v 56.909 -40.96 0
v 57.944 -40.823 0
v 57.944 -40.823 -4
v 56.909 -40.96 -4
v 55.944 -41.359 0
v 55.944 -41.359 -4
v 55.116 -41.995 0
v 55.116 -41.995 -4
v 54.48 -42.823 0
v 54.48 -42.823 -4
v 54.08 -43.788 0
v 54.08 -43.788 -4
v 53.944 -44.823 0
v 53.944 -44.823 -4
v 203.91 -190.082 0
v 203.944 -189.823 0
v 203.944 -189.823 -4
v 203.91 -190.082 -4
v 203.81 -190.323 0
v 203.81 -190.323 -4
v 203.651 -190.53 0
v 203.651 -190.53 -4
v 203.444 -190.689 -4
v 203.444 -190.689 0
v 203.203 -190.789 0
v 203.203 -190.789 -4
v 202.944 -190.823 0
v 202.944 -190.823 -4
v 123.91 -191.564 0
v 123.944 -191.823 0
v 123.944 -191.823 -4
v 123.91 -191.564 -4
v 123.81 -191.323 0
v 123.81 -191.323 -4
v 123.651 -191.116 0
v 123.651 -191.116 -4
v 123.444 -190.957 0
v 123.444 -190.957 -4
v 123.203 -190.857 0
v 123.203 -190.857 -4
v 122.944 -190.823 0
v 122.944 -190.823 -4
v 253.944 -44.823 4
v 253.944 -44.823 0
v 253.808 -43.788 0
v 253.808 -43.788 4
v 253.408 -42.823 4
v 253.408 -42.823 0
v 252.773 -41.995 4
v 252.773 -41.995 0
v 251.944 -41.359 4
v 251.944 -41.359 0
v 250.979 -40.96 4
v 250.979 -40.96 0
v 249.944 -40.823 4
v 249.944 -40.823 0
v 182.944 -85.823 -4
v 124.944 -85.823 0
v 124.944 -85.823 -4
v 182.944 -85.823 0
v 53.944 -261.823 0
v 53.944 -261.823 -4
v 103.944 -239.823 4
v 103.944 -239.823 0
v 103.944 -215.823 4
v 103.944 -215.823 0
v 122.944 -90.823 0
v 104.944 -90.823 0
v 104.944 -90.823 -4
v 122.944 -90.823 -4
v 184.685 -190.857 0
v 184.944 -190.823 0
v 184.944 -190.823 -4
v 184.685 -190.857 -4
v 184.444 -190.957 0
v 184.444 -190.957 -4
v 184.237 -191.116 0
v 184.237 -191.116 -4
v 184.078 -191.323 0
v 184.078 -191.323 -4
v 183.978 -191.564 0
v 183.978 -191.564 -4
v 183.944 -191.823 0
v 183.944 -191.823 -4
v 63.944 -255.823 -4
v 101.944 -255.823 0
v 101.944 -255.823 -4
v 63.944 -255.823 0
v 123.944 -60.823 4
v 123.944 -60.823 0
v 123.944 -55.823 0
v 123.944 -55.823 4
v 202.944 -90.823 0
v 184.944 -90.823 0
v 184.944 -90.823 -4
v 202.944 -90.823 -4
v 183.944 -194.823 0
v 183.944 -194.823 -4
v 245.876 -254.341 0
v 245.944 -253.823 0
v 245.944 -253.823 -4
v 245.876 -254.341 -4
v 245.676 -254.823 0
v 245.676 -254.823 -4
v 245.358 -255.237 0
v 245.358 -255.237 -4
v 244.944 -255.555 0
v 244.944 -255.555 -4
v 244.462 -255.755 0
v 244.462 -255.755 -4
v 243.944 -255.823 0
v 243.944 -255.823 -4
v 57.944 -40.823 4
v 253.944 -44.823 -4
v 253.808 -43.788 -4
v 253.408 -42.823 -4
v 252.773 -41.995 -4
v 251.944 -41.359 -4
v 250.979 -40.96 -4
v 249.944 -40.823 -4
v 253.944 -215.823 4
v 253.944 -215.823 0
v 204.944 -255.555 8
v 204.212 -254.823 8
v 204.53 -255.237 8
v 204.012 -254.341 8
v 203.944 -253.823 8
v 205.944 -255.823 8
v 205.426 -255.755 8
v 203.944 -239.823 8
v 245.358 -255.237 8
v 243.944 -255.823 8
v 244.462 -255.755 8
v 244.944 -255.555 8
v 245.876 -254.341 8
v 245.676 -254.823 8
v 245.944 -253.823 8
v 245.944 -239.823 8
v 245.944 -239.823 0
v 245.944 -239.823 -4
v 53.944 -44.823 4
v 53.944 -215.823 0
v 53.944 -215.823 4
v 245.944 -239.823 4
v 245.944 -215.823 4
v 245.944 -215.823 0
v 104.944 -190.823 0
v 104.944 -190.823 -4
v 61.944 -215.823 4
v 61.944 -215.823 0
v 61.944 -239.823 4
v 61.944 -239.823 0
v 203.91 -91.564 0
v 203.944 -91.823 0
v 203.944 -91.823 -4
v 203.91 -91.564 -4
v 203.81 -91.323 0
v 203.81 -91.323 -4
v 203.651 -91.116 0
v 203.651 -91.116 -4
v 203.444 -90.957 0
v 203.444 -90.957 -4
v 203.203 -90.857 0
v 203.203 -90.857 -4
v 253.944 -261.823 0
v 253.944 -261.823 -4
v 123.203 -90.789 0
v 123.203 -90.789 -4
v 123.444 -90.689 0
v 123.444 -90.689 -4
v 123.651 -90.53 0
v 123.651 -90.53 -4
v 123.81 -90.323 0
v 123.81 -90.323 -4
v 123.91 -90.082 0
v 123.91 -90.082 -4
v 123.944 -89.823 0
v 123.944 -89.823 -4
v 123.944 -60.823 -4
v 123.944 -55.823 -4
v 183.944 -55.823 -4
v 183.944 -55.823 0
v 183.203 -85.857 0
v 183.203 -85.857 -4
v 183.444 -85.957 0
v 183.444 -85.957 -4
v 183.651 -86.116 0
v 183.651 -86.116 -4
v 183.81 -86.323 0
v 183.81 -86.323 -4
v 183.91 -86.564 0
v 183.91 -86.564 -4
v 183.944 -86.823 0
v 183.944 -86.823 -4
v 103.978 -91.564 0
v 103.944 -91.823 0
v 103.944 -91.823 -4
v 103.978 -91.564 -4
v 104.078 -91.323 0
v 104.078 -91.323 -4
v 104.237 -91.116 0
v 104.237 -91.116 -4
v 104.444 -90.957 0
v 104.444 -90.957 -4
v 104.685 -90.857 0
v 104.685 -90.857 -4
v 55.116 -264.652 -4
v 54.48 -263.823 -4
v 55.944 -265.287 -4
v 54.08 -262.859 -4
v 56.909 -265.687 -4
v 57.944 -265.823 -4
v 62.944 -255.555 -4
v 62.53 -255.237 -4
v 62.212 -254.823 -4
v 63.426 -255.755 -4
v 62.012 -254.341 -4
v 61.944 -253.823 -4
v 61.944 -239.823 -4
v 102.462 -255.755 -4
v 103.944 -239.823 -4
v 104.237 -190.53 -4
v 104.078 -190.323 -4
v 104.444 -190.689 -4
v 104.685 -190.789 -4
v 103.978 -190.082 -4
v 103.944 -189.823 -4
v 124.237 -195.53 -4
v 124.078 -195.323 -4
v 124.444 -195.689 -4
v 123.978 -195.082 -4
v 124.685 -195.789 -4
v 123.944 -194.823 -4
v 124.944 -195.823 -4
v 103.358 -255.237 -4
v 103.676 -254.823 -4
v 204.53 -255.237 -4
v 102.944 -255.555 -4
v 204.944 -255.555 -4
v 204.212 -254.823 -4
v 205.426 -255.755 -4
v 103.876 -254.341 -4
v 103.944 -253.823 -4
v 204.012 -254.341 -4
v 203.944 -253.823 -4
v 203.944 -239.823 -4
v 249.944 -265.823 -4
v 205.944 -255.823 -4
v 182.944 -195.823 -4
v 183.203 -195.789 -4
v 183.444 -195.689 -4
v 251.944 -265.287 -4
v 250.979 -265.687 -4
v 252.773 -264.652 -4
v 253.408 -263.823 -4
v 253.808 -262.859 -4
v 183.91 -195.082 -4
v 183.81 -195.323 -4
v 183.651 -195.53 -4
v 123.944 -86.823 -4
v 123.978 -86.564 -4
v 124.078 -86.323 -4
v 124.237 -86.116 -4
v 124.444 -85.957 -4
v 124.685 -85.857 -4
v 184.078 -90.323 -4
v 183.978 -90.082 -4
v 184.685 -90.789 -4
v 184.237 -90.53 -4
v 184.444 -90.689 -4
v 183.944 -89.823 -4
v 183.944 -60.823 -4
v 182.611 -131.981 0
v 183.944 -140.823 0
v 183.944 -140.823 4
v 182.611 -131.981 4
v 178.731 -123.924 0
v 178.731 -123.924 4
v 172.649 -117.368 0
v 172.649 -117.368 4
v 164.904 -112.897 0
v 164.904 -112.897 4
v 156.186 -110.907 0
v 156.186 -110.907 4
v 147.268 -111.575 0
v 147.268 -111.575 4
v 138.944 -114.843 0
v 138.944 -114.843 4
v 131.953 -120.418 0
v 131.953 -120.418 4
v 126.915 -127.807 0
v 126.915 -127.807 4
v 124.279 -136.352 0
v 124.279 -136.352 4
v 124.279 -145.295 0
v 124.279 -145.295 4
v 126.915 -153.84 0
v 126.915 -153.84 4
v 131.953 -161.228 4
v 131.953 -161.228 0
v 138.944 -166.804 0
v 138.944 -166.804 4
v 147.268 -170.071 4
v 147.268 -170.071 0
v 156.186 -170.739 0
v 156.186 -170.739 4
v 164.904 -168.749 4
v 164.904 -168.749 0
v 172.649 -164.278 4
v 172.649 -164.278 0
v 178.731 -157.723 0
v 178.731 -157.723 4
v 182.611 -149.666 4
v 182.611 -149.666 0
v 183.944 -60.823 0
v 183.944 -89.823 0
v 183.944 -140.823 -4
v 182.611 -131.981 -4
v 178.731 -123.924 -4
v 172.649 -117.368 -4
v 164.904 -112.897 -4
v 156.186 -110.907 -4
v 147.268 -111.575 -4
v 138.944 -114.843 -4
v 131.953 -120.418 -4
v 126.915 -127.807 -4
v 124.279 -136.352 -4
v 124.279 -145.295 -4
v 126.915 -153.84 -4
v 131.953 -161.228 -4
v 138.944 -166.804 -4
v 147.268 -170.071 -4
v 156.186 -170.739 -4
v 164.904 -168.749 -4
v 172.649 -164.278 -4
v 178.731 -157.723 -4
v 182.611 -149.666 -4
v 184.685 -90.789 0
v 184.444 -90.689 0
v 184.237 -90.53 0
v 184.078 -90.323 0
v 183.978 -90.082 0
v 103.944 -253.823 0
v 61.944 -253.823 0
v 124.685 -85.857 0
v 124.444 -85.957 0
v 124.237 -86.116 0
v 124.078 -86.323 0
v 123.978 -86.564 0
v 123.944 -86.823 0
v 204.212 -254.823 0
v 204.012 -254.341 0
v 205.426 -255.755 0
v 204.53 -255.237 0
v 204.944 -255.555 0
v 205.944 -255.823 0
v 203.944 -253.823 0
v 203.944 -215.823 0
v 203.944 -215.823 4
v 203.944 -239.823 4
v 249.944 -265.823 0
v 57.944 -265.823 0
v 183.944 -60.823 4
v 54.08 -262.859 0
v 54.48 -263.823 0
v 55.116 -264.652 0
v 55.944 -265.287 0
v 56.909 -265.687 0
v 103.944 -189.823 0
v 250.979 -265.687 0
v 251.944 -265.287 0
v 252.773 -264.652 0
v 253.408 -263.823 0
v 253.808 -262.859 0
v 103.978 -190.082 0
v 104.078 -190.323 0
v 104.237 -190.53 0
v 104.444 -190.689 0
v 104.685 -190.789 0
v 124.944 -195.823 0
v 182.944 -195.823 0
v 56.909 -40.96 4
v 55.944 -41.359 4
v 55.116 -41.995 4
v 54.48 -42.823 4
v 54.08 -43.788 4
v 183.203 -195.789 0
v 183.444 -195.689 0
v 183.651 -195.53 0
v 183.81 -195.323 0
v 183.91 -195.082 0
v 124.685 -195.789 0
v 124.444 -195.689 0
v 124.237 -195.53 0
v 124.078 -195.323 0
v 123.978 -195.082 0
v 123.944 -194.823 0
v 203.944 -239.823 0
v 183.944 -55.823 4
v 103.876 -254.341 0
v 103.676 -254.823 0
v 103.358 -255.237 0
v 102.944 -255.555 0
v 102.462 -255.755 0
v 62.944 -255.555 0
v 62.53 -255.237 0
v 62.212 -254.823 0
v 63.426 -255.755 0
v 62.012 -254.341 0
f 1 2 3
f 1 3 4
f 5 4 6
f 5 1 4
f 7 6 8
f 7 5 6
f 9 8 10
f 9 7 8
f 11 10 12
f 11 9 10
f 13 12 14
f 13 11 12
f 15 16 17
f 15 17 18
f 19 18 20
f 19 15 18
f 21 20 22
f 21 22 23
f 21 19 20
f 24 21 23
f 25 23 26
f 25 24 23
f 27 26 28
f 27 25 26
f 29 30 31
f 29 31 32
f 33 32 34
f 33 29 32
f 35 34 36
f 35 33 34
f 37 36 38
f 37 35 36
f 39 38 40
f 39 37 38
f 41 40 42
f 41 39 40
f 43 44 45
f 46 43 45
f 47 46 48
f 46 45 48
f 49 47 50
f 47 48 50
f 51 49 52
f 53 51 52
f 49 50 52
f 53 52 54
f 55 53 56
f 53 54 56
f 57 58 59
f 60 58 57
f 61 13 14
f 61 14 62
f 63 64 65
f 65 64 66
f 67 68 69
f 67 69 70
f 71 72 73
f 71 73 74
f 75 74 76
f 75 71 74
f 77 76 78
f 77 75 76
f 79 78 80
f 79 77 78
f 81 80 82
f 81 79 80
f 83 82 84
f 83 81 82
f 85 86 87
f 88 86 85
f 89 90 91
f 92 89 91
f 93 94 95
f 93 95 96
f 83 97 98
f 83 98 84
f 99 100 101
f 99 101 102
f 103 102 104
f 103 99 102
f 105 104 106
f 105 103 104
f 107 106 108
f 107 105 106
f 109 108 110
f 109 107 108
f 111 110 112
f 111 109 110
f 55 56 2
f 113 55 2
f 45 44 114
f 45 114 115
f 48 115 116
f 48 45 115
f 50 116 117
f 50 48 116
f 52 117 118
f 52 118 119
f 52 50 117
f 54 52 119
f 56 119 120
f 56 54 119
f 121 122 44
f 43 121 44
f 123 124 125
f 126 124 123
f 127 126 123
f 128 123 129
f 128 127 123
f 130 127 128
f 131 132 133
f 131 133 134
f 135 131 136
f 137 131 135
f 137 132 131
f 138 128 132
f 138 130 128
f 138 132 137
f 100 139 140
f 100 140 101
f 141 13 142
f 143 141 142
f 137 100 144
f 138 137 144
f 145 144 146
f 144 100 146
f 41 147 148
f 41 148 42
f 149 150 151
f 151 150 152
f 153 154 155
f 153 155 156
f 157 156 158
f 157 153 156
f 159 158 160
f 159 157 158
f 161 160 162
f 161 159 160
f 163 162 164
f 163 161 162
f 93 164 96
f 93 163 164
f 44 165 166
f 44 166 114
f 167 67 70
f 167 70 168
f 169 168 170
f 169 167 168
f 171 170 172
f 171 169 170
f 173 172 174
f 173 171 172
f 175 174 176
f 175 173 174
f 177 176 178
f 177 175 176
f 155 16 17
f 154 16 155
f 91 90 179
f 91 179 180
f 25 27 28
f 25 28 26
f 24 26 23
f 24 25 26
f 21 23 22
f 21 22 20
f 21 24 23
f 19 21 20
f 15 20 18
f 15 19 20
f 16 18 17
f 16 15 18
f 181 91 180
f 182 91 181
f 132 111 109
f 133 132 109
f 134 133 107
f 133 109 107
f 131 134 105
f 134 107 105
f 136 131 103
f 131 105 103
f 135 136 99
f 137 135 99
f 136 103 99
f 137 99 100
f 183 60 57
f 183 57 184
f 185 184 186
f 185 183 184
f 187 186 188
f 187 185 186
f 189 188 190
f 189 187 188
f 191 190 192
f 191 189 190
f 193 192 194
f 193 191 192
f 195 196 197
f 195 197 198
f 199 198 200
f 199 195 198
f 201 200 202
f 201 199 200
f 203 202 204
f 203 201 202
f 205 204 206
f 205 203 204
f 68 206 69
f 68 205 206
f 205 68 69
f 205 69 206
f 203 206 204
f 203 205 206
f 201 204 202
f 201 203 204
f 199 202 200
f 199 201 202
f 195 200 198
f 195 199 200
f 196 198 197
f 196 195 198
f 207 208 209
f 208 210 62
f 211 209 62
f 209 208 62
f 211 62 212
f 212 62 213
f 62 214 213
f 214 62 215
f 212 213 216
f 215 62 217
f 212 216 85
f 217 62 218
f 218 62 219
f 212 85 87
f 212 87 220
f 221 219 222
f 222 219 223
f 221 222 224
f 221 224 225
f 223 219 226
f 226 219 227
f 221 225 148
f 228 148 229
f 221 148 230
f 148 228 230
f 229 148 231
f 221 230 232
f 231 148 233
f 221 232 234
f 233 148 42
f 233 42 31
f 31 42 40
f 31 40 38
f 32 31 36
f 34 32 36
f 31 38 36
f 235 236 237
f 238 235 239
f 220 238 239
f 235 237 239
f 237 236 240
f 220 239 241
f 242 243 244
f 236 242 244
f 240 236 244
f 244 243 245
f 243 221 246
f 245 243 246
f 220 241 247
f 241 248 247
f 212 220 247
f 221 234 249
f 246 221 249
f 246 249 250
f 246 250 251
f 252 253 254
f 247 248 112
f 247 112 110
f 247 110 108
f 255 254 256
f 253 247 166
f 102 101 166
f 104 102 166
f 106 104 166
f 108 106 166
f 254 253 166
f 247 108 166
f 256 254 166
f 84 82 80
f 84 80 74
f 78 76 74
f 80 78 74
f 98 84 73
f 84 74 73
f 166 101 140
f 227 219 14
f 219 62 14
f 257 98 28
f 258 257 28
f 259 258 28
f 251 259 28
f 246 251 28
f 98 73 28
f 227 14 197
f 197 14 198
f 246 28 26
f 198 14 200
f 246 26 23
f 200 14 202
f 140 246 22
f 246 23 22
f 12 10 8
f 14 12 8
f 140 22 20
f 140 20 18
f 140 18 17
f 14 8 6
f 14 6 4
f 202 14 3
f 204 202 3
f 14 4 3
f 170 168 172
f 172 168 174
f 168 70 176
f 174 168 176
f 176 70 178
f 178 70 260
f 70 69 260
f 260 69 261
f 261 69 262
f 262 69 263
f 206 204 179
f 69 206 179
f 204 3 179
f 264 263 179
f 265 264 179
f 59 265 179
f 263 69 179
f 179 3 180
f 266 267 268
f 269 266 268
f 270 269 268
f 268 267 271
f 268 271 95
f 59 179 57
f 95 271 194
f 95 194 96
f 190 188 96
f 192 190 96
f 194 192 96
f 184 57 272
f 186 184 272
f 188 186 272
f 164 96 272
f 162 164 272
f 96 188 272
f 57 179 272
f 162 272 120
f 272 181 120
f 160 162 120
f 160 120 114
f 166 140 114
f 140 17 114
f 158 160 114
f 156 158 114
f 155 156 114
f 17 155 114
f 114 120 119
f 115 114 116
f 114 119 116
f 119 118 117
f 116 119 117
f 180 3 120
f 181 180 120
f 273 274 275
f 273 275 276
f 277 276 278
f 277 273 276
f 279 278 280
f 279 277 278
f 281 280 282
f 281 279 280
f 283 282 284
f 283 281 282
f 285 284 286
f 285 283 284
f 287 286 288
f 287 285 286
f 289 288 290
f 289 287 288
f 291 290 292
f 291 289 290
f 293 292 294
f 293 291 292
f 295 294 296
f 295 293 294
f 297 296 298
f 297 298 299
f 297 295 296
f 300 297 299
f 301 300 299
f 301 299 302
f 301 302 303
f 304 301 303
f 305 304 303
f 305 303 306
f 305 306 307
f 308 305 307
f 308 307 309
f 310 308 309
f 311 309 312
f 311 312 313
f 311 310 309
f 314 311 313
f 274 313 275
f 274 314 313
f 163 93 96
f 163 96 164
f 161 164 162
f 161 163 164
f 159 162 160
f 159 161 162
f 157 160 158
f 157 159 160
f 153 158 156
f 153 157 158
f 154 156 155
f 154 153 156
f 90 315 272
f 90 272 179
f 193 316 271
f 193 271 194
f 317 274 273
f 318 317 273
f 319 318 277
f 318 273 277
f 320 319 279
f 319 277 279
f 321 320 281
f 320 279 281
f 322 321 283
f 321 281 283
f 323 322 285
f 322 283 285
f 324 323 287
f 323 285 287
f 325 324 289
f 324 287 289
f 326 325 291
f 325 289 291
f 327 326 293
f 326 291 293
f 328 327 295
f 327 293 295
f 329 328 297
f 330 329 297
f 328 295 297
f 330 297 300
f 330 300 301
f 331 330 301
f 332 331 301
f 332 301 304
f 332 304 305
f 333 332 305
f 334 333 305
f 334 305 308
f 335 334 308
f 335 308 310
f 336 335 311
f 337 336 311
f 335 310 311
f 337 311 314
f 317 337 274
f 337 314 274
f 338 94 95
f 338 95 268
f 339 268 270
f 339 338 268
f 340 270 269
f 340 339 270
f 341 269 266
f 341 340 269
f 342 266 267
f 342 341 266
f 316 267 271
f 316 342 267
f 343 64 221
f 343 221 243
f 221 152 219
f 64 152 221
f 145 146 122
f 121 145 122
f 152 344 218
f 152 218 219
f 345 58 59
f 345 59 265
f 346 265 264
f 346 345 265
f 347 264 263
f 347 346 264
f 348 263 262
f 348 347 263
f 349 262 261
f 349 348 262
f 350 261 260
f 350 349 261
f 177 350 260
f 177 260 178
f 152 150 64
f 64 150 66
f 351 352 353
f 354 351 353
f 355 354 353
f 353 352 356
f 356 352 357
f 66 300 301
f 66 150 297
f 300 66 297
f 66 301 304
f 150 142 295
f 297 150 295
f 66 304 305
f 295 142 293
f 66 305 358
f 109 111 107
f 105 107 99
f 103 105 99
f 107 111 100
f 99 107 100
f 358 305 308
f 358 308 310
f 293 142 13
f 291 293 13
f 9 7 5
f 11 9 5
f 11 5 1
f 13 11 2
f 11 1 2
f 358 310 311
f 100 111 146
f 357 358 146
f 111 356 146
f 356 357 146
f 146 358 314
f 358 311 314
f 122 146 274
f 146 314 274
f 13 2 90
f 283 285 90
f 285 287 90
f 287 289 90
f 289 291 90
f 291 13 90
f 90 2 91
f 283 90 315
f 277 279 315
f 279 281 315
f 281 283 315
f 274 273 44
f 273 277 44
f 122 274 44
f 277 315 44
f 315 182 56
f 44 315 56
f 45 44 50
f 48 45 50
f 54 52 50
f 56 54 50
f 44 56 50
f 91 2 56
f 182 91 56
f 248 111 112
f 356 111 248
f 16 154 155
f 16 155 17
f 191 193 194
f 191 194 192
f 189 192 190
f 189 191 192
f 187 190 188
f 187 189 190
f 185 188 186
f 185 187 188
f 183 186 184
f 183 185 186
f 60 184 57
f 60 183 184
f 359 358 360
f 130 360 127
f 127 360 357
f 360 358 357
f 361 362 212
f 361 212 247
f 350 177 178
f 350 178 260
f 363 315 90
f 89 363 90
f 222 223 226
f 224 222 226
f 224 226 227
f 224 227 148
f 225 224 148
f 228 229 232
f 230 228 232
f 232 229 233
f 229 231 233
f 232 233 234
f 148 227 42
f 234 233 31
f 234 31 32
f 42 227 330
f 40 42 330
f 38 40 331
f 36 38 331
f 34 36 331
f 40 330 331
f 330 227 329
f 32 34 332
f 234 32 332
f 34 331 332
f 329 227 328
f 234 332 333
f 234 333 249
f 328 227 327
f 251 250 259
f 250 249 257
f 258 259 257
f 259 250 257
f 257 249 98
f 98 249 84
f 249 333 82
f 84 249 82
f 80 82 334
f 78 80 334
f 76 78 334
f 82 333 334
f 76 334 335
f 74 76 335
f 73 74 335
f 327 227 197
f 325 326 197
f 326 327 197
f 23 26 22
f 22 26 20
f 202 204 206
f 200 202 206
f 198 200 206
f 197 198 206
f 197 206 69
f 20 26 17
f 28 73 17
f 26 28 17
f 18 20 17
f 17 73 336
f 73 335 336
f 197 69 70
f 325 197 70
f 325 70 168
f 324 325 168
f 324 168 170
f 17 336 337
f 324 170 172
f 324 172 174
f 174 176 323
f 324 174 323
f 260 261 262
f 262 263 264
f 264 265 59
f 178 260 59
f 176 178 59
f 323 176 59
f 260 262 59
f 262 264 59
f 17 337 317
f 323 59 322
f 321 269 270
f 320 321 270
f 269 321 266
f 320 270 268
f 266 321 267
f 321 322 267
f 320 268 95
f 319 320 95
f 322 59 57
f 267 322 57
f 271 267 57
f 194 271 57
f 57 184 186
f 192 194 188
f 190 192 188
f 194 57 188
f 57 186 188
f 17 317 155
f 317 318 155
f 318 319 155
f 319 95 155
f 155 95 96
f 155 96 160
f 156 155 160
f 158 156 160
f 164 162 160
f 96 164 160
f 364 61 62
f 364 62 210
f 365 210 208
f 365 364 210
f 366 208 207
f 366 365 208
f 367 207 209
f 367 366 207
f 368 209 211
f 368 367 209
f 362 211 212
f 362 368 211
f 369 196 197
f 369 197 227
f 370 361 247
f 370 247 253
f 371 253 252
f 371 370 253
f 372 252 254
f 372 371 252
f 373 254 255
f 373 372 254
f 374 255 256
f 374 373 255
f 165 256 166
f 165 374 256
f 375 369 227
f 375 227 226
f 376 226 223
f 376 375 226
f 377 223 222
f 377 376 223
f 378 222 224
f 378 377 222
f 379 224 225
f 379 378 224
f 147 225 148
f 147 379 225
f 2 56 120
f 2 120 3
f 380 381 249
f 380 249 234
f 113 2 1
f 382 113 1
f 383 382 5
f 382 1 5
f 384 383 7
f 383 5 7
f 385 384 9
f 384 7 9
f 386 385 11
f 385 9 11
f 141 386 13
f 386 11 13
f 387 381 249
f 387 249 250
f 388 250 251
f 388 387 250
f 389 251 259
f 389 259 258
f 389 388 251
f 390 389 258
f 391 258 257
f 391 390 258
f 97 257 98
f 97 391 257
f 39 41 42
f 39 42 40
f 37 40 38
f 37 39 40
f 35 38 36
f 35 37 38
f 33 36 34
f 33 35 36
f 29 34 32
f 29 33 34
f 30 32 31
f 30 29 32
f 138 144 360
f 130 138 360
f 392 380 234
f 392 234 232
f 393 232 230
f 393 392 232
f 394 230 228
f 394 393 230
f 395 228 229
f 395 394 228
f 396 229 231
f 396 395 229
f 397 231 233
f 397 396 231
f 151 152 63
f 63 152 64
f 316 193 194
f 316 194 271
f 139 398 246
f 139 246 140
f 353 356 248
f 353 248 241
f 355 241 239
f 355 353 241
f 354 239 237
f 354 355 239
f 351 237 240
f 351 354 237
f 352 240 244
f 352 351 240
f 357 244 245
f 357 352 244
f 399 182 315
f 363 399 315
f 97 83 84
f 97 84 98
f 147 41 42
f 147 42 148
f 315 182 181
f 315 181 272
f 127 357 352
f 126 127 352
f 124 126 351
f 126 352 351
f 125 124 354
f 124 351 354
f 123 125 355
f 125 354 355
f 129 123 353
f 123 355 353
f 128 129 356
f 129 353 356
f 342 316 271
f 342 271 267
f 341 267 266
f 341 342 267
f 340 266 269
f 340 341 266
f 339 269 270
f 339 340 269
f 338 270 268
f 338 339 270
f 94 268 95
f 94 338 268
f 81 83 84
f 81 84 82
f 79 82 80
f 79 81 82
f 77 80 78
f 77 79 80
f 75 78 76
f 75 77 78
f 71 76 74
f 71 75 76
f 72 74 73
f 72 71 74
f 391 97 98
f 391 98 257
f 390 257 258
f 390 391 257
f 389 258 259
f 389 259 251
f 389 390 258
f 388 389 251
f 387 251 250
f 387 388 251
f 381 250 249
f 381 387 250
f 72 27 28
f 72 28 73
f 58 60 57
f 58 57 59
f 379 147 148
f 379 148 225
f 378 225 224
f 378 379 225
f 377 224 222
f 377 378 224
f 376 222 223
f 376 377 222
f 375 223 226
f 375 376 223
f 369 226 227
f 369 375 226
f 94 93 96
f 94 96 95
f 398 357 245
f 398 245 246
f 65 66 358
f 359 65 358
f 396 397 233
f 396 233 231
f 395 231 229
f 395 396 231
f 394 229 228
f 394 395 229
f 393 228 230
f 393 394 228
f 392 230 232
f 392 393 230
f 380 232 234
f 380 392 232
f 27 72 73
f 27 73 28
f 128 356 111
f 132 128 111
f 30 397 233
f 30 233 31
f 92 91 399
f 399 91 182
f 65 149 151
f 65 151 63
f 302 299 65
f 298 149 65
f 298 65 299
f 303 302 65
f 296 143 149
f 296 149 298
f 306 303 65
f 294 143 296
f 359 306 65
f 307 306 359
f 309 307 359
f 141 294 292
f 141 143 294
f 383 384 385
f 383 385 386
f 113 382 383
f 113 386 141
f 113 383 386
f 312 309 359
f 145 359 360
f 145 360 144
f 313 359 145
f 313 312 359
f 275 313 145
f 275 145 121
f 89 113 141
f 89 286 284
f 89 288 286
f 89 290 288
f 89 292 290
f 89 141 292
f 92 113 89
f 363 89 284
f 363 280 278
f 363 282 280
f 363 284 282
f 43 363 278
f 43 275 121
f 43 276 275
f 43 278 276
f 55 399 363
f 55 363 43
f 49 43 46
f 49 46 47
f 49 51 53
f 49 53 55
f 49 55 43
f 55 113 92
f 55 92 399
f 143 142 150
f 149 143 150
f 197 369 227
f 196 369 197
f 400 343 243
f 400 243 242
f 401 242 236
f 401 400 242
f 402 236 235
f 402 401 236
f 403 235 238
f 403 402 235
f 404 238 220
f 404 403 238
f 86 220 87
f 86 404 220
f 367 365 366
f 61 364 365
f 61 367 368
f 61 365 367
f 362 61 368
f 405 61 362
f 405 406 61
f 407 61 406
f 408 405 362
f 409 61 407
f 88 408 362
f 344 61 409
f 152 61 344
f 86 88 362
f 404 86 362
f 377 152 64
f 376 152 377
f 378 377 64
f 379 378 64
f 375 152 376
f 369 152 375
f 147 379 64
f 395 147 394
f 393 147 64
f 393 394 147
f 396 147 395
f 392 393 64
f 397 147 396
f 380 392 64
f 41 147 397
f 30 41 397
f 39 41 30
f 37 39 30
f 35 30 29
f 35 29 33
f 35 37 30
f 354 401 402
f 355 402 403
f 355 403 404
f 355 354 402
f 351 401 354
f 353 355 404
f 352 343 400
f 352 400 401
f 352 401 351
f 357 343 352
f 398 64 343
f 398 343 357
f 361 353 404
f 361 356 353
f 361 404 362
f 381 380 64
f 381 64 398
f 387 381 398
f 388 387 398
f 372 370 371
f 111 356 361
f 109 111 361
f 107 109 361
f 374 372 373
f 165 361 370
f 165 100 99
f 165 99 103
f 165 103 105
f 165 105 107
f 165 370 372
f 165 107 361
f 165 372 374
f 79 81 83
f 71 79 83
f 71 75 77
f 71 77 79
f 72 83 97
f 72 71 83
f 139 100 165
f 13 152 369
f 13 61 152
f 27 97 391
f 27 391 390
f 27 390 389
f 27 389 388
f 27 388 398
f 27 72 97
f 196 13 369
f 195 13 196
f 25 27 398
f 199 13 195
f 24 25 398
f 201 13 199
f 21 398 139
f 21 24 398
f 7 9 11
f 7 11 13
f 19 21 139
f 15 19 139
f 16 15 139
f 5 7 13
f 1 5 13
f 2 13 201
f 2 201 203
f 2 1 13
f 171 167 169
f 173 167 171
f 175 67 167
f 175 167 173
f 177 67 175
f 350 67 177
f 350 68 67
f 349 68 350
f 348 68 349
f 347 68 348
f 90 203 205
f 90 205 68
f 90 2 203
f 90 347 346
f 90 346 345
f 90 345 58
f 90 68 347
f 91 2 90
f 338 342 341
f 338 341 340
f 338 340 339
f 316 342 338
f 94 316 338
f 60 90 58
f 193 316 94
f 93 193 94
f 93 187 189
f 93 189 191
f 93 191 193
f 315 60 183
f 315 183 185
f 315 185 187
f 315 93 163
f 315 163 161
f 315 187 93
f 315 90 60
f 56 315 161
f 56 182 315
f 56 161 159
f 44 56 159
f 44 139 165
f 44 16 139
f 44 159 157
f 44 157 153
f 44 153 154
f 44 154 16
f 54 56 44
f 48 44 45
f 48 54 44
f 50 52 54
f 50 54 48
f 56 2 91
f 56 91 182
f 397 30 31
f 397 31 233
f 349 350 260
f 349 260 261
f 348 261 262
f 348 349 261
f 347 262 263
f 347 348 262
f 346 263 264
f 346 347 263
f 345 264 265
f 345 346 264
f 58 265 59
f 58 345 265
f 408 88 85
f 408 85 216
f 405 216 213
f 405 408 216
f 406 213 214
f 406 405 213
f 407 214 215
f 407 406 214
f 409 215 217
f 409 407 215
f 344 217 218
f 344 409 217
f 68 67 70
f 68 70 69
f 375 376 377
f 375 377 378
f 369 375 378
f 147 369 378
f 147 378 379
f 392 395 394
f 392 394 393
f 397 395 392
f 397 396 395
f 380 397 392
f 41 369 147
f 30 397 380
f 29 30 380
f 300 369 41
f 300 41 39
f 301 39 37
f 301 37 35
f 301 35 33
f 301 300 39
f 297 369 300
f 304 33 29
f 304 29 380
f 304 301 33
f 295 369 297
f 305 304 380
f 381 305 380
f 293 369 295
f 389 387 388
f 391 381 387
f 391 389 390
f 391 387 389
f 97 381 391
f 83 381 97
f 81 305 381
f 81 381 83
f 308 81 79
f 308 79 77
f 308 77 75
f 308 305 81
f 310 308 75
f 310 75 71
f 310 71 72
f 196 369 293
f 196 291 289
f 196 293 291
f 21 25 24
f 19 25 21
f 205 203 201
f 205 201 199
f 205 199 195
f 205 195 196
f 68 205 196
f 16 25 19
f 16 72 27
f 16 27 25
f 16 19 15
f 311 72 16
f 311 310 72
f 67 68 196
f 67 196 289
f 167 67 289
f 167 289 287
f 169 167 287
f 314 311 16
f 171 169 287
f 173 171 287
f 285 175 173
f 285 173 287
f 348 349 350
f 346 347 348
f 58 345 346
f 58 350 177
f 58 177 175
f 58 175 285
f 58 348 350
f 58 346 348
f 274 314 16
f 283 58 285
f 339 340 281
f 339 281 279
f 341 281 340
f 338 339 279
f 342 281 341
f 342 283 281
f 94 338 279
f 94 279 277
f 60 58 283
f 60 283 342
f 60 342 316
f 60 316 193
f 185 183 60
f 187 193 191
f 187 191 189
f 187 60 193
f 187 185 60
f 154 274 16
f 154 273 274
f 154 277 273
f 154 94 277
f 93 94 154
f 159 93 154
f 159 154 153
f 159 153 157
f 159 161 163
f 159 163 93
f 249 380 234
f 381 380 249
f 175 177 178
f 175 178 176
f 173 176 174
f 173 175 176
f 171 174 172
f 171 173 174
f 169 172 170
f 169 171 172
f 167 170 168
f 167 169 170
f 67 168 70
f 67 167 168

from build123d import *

# Parameters (mm, degrees)
F1_R     = 30
F2_DEPTH = 4
F3_DEPTH = 4
F4_DEPTH = 4
F5_DEPTH = 8


with BuildPart() as f2:
    # F1 (on Top) → F2 (new body)
    with BuildSketch(Plane.XY):
        with BuildLine():
            Line((249.9441257715, -40.8232776821), (57.9441257715, -40.8232776821))
            ThreePointArc((57.9441257715, -40.8232776821), (55.1156986468, -41.9948505573), (53.9441257715, -44.8232776821))
            Line((53.9441257715, -44.8232776821), (53.9441257715, -215.8232776821))
            Line((53.9441257715, -215.8232776821), (61.9441257715, -215.8232776821))
            Line((61.9441257715, -215.8232776821), (61.9441257715, -239.8232776821))
            Line((61.9441257715, -239.8232776821), (103.9441257715, -239.8232776821))
            Line((103.9441257715, -239.8232776821), (103.9441257715, -215.8232776821))
            Line((103.9441257715, -215.8232776821), (203.9441257715, -215.8232776821))
            Line((203.9441257715, -215.8232776821), (203.9441257715, -239.8232776821))
            Line((203.9441257715, -239.8232776821), (245.9441257715, -239.8232776821))
            Line((245.9441257715, -239.8232776821), (245.9441257715, -215.8232776821))
            Line((245.9441257715, -215.8232776821), (253.9441257715, -215.8232776821))
            Line((253.9441257715, -215.8232776821), (253.9441257715, -44.8232776821))
            ThreePointArc((253.9441257715, -44.8232776821), (252.7725528963, -41.9948505573), (249.9441257715, -40.8232776821))
        make_face()
        with BuildLine():
            Line((124.9441257715, -85.8232776821), (153.9441257715, -85.8232776821))
            Line((153.9441257715, -85.8232776821), (182.9441257715, -85.8232776821))
            ThreePointArc((182.9441257715, -85.8232776821), (183.6512325527, -86.1161709009), (183.9441257715, -86.8232776821))
            Line((183.9441257715, -86.8232776821), (183.9441257715, -89.8232776821))
            ThreePointArc((183.9441257715, -89.8232776821), (184.2370189903, -90.5303844633), (184.9441257715, -90.8232776821))
            Line((184.9441257715, -90.8232776821), (202.9441257715, -90.8232776821))
            ThreePointArc((202.9441257715, -90.8232776821), (203.6512325527, -91.1161709009), (203.9441257715, -91.8232776821))
            Line((203.9441257715, -91.8232776821), (203.9441257715, -140.8232776821))
            Line((203.9441257715, -140.8232776821), (203.9441257715, -189.8232776821))
            ThreePointArc((203.9441257715, -189.8232776821), (203.6512325527, -190.5303844633), (202.9441257715, -190.8232776821))
            Line((202.9441257715, -190.8232776821), (184.9441257715, -190.8232776821))
            ThreePointArc((184.9441257715, -190.8232776821), (184.2370189903, -191.1161709009), (183.9441257715, -191.8232776821))
            Line((183.9441257715, -191.8232776821), (183.9441257715, -194.8232776821))
            ThreePointArc((183.9441257715, -194.8232776821), (183.6512325527, -195.5303844633), (182.9441257715, -195.8232776821))
            Line((182.9441257715, -195.8232776821), (153.9441257715, -195.8232776821))
            Line((153.9441257715, -195.8232776821), (124.9441257715, -195.8232776821))
            ThreePointArc((124.9441257715, -195.8232776821), (124.2370189903, -195.5303844633), (123.9441257715, -194.8232776821))
            Line((123.9441257715, -194.8232776821), (123.9441257715, -191.8232776821))
            ThreePointArc((123.9441257715, -191.8232776821), (123.6512325527, -191.1161709009), (122.9441257715, -190.8232776821))
            Line((122.9441257715, -190.8232776821), (104.9441257715, -190.8232776821))
            ThreePointArc((104.9441257715, -190.8232776821), (104.2370189903, -190.5303844633), (103.9441257715, -189.8232776821))
            Line((103.9441257715, -189.8232776821), (103.9441257715, -140.8232776821))
            Line((103.9441257715, -140.8232776821), (103.9441257715, -91.8232776821))
            ThreePointArc((103.9441257715, -91.8232776821), (104.2370189903, -91.1161709009), (104.9441257715, -90.8232776821))
            Line((104.9441257715, -90.8232776821), (122.9441257715, -90.8232776821))
            ThreePointArc((122.9441257715, -90.8232776821), (123.6512325527, -90.5303844633), (123.9441257715, -89.8232776821))
            Line((123.9441257715, -89.8232776821), (123.9441257715, -86.8232776821))
            ThreePointArc((123.9441257715, -86.8232776821), (124.2370189903, -86.1161709009), (124.9441257715, -85.8232776821))
        make_face(mode=Mode.SUBTRACT)
        Polygon((123.9441257715, -60.8232776821), (123.9441257715, -55.8232776821), (153.9441257715, -55.8232776821), (183.9441257715, -55.8232776821), (183.9441257715, -60.8232776821), (153.9441257715, -60.8232776821), align=None, mode=Mode.SUBTRACT)
        with BuildLine():
            Line((245.9441257715, -253.8232776821), (245.9441257715, -239.8232776821))
            Line((245.9441257715, -239.8232776821), (203.9441257715, -239.8232776821))
            Line((203.9441257715, -239.8232776821), (203.9441257715, -253.8232776821))
            ThreePointArc((203.9441257715, -253.8232776821), (204.5299122091, -255.2374912444), (205.9441257715, -255.8232776821))
            Line((205.9441257715, -255.8232776821), (243.9441257715, -255.8232776821))
            ThreePointArc((243.9441257715, -255.8232776821), (245.3583393339, -255.2374912444), (245.9441257715, -253.8232776821))
        make_face()
        with BuildLine():
            Line((182.9441257715, -85.8232776821), (153.9441257715, -85.8232776821))
            Line((153.9441257715, -85.8232776821), (124.9441257715, -85.8232776821))
            ThreePointArc((124.9441257715, -85.8232776821), (124.2370189903, -86.1161709009), (123.9441257715, -86.8232776821))
            Line((123.9441257715, -86.8232776821), (123.9441257715, -89.8232776821))
            ThreePointArc((123.9441257715, -89.8232776821), (123.6512325527, -90.5303844633), (122.9441257715, -90.8232776821))
            Line((122.9441257715, -90.8232776821), (104.9441257715, -90.8232776821))
            ThreePointArc((104.9441257715, -90.8232776821), (104.2370189903, -91.1161709009), (103.9441257715, -91.8232776821))
            Line((103.9441257715, -91.8232776821), (103.9441257715, -140.8232776821))
            Line((103.9441257715, -140.8232776821), (103.9441257715, -189.8232776821))
            ThreePointArc((103.9441257715, -189.8232776821), (104.2370189903, -190.5303844633), (104.9441257715, -190.8232776821))
            Line((104.9441257715, -190.8232776821), (122.9441257715, -190.8232776821))
            ThreePointArc((122.9441257715, -190.8232776821), (123.6512325527, -191.1161709009), (123.9441257715, -191.8232776821))
            Line((123.9441257715, -191.8232776821), (123.9441257715, -194.8232776821))
            ThreePointArc((123.9441257715, -194.8232776821), (124.2370189903, -195.5303844633), (124.9441257715, -195.8232776821))
            Line((124.9441257715, -195.8232776821), (153.9441257715, -195.8232776821))
            Line((153.9441257715, -195.8232776821), (182.9441257715, -195.8232776821))
            ThreePointArc((182.9441257715, -195.8232776821), (183.6512325527, -195.5303844633), (183.9441257715, -194.8232776821))
            Line((183.9441257715, -194.8232776821), (183.9441257715, -191.8232776821))
            ThreePointArc((183.9441257715, -191.8232776821), (184.2370189903, -191.1161709009), (184.9441257715, -190.8232776821))
            Line((184.9441257715, -190.8232776821), (202.9441257715, -190.8232776821))
            ThreePointArc((202.9441257715, -190.8232776821), (203.6512325527, -190.5303844633), (203.9441257715, -189.8232776821))
            Line((203.9441257715, -189.8232776821), (203.9441257715, -140.8232776821))
            Line((203.9441257715, -140.8232776821), (203.9441257715, -91.8232776821))
            ThreePointArc((203.9441257715, -91.8232776821), (203.6512325527, -91.1161709009), (202.9441257715, -90.8232776821))
            Line((202.9441257715, -90.8232776821), (184.9441257715, -90.8232776821))
            ThreePointArc((184.9441257715, -90.8232776821), (184.2370189903, -90.5303844633), (183.9441257715, -89.8232776821))
            Line((183.9441257715, -89.8232776821), (183.9441257715, -86.8232776821))
            ThreePointArc((183.9441257715, -86.8232776821), (183.6512325527, -86.1161709009), (182.9441257715, -85.8232776821))
        make_face()
        with Locations((153.9441257715, -140.8232776821)):
            Circle(F1_R, mode=Mode.SUBTRACT)
    extrude(amount=F2_DEPTH)

    # F1 (on Top) → F5 (join)
    with BuildSketch(Plane.XY):
        with BuildLine():
            Line((245.9441257715, -253.8232776821), (245.9441257715, -239.8232776821))
            Line((245.9441257715, -239.8232776821), (203.9441257715, -239.8232776821))
            Line((203.9441257715, -239.8232776821), (203.9441257715, -253.8232776821))
            ThreePointArc((203.9441257715, -253.8232776821), (204.5299122091, -255.2374912444), (205.9441257715, -255.8232776821))
            Line((205.9441257715, -255.8232776821), (243.9441257715, -255.8232776821))
            ThreePointArc((243.9441257715, -255.8232776821), (245.3583393339, -255.2374912444), (245.9441257715, -253.8232776821))
        make_face()
    extrude(amount=F5_DEPTH)


with BuildPart() as f3:
    # F1 (on Top) → F3 (new body)
    with BuildSketch(Plane.XY):
        with BuildLine():
            Line((182.9441257715, -85.8232776821), (153.9441257715, -85.8232776821))
            Line((153.9441257715, -85.8232776821), (124.9441257715, -85.8232776821))
            ThreePointArc((124.9441257715, -85.8232776821), (124.2370189903, -86.1161709009), (123.9441257715, -86.8232776821))
            Line((123.9441257715, -86.8232776821), (123.9441257715, -89.8232776821))
            ThreePointArc((123.9441257715, -89.8232776821), (123.6512325527, -90.5303844633), (122.9441257715, -90.8232776821))
            Line((122.9441257715, -90.8232776821), (104.9441257715, -90.8232776821))
            ThreePointArc((104.9441257715, -90.8232776821), (104.2370189903, -91.1161709009), (103.9441257715, -91.8232776821))
            Line((103.9441257715, -91.8232776821), (103.9441257715, -140.8232776821))
            Line((103.9441257715, -140.8232776821), (103.9441257715, -189.8232776821))
            ThreePointArc((103.9441257715, -189.8232776821), (104.2370189903, -190.5303844633), (104.9441257715, -190.8232776821))
            Line((104.9441257715, -190.8232776821), (122.9441257715, -190.8232776821))
            ThreePointArc((122.9441257715, -190.8232776821), (123.6512325527, -191.1161709009), (123.9441257715, -191.8232776821))
            Line((123.9441257715, -191.8232776821), (123.9441257715, -194.8232776821))
            ThreePointArc((123.9441257715, -194.8232776821), (124.2370189903, -195.5303844633), (124.9441257715, -195.8232776821))
            Line((124.9441257715, -195.8232776821), (153.9441257715, -195.8232776821))
            Line((153.9441257715, -195.8232776821), (182.9441257715, -195.8232776821))
            ThreePointArc((182.9441257715, -195.8232776821), (183.6512325527, -195.5303844633), (183.9441257715, -194.8232776821))
            Line((183.9441257715, -194.8232776821), (183.9441257715, -191.8232776821))
            ThreePointArc((183.9441257715, -191.8232776821), (184.2370189903, -191.1161709009), (184.9441257715, -190.8232776821))
            Line((184.9441257715, -190.8232776821), (202.9441257715, -190.8232776821))
            ThreePointArc((202.9441257715, -190.8232776821), (203.6512325527, -190.5303844633), (203.9441257715, -189.8232776821))
            Line((203.9441257715, -189.8232776821), (203.9441257715, -140.8232776821))
            Line((203.9441257715, -140.8232776821), (203.9441257715, -91.8232776821))
            ThreePointArc((203.9441257715, -91.8232776821), (203.6512325527, -91.1161709009), (202.9441257715, -90.8232776821))
            Line((202.9441257715, -90.8232776821), (184.9441257715, -90.8232776821))
            ThreePointArc((184.9441257715, -90.8232776821), (184.2370189903, -90.5303844633), (183.9441257715, -89.8232776821))
            Line((183.9441257715, -89.8232776821), (183.9441257715, -86.8232776821))
            ThreePointArc((183.9441257715, -86.8232776821), (183.6512325527, -86.1161709009), (182.9441257715, -85.8232776821))
        make_face()
        with Locations((153.9441257715, -140.8232776821)):
            Circle(F1_R, mode=Mode.SUBTRACT)
    extrude(amount=-F3_DEPTH)


with BuildPart() as f4:
    # F1 (on Top) → F4 (new body)
    with BuildSketch(Plane.XY):
        with BuildLine():
            Line((61.9441257715, -215.8232776821), (53.9441257715, -215.8232776821))
            Line((53.9441257715, -215.8232776821), (53.9441257715, -261.8232776821))
            ThreePointArc((53.9441257715, -261.8232776821), (55.1156986468, -264.6517048068), (57.9441257715, -265.8232776821))
            Line((57.9441257715, -265.8232776821), (249.9441257715, -265.8232776821))
            ThreePointArc((249.9441257715, -265.8232776821), (252.7725528963, -264.6517048068), (253.9441257715, -261.8232776821))
            Line((253.9441257715, -261.8232776821), (253.9441257715, -215.8232776821))
            Line((253.9441257715, -215.8232776821), (245.9441257715, -215.8232776821))
            Line((245.9441257715, -215.8232776821), (245.9441257715, -239.8232776821))
            Line((245.9441257715, -239.8232776821), (245.9441257715, -253.8232776821))
            ThreePointArc((245.9441257715, -253.8232776821), (245.3583393339, -255.2374912444), (243.9441257715, -255.8232776821))
            Line((243.9441257715, -255.8232776821), (205.9441257715, -255.8232776821))
            ThreePointArc((205.9441257715, -255.8232776821), (204.5299122091, -255.2374912444), (203.9441257715, -253.8232776821))
            Line((203.9441257715, -253.8232776821), (203.9441257715, -239.8232776821))
            Line((203.9441257715, -239.8232776821), (203.9441257715, -215.8232776821))
            Line((203.9441257715, -215.8232776821), (103.9441257715, -215.8232776821))
            Line((103.9441257715, -215.8232776821), (103.9441257715, -239.8232776821))
            Line((103.9441257715, -239.8232776821), (103.9441257715, -253.8232776821))
            ThreePointArc((103.9441257715, -253.8232776821), (103.3583393339, -255.2374912444), (101.9441257715, -255.8232776821))
            Line((101.9441257715, -255.8232776821), (63.9441257715, -255.8232776821))
            ThreePointArc((63.9441257715, -255.8232776821), (62.5299122091, -255.2374912444), (61.9441257715, -253.8232776821))
            Line((61.9441257715, -253.8232776821), (61.9441257715, -239.8232776821))
            Line((61.9441257715, -239.8232776821), (61.9441257715, -215.8232776821))
        make_face()
        with BuildLine():
            Line((249.9441257715, -40.8232776821), (57.9441257715, -40.8232776821))
            ThreePointArc((57.9441257715, -40.8232776821), (55.1156986468, -41.9948505573), (53.9441257715, -44.8232776821))
            Line((53.9441257715, -44.8232776821), (53.9441257715, -215.8232776821))
            Line((53.9441257715, -215.8232776821), (61.9441257715, -215.8232776821))
            Line((61.9441257715, -215.8232776821), (61.9441257715, -239.8232776821))
            Line((61.9441257715, -239.8232776821), (103.9441257715, -239.8232776821))
            Line((103.9441257715, -239.8232776821), (103.9441257715, -215.8232776821))
            Line((103.9441257715, -215.8232776821), (203.9441257715, -215.8232776821))
            Line((203.9441257715, -215.8232776821), (203.9441257715, -239.8232776821))
            Line((203.9441257715, -239.8232776821), (245.9441257715, -239.8232776821))
            Line((245.9441257715, -239.8232776821), (245.9441257715, -215.8232776821))
            Line((245.9441257715, -215.8232776821), (253.9441257715, -215.8232776821))
            Line((253.9441257715, -215.8232776821), (253.9441257715, -44.8232776821))
            ThreePointArc((253.9441257715, -44.8232776821), (252.7725528963, -41.9948505573), (249.9441257715, -40.8232776821))
        make_face()
        with BuildLine():
            Line((124.9441257715, -85.8232776821), (153.9441257715, -85.8232776821))
            Line((153.9441257715, -85.8232776821), (182.9441257715, -85.8232776821))
            ThreePointArc((182.9441257715, -85.8232776821), (183.6512325527, -86.1161709009), (183.9441257715, -86.8232776821))
            Line((183.9441257715, -86.8232776821), (183.9441257715, -89.8232776821))
            ThreePointArc((183.9441257715, -89.8232776821), (184.2370189903, -90.5303844633), (184.9441257715, -90.8232776821))
            Line((184.9441257715, -90.8232776821), (202.9441257715, -90.8232776821))
            ThreePointArc((202.9441257715, -90.8232776821), (203.6512325527, -91.1161709009), (203.9441257715, -91.8232776821))
            Line((203.9441257715, -91.8232776821), (203.9441257715, -140.8232776821))
            Line((203.9441257715, -140.8232776821), (203.9441257715, -189.8232776821))
            ThreePointArc((203.9441257715, -189.8232776821), (203.6512325527, -190.5303844633), (202.9441257715, -190.8232776821))
            Line((202.9441257715, -190.8232776821), (184.9441257715, -190.8232776821))
            ThreePointArc((184.9441257715, -190.8232776821), (184.2370189903, -191.1161709009), (183.9441257715, -191.8232776821))
            Line((183.9441257715, -191.8232776821), (183.9441257715, -194.8232776821))
            ThreePointArc((183.9441257715, -194.8232776821), (183.6512325527, -195.5303844633), (182.9441257715, -195.8232776821))
            Line((182.9441257715, -195.8232776821), (153.9441257715, -195.8232776821))
            Line((153.9441257715, -195.8232776821), (124.9441257715, -195.8232776821))
            ThreePointArc((124.9441257715, -195.8232776821), (124.2370189903, -195.5303844633), (123.9441257715, -194.8232776821))
            Line((123.9441257715, -194.8232776821), (123.9441257715, -191.8232776821))
            ThreePointArc((123.9441257715, -191.8232776821), (123.6512325527, -191.1161709009), (122.9441257715, -190.8232776821))
            Line((122.9441257715, -190.8232776821), (104.9441257715, -190.8232776821))
            ThreePointArc((104.9441257715, -190.8232776821), (104.2370189903, -190.5303844633), (103.9441257715, -189.8232776821))
            Line((103.9441257715, -189.8232776821), (103.9441257715, -140.8232776821))
            Line((103.9441257715, -140.8232776821), (103.9441257715, -91.8232776821))
            ThreePointArc((103.9441257715, -91.8232776821), (104.2370189903, -91.1161709009), (104.9441257715, -90.8232776821))
            Line((104.9441257715, -90.8232776821), (122.9441257715, -90.8232776821))
            ThreePointArc((122.9441257715, -90.8232776821), (123.6512325527, -90.5303844633), (123.9441257715, -89.8232776821))
            Line((123.9441257715, -89.8232776821), (123.9441257715, -86.8232776821))
            ThreePointArc((123.9441257715, -86.8232776821), (124.2370189903, -86.1161709009), (124.9441257715, -85.8232776821))
        make_face(mode=Mode.SUBTRACT)
        Polygon((123.9441257715, -60.8232776821), (123.9441257715, -55.8232776821), (153.9441257715, -55.8232776821), (183.9441257715, -55.8232776821), (183.9441257715, -60.8232776821), (153.9441257715, -60.8232776821), align=None, mode=Mode.SUBTRACT)
    extrude(amount=-F4_DEPTH)


solid = Compound([f2.part, f3.part, f4.part])
